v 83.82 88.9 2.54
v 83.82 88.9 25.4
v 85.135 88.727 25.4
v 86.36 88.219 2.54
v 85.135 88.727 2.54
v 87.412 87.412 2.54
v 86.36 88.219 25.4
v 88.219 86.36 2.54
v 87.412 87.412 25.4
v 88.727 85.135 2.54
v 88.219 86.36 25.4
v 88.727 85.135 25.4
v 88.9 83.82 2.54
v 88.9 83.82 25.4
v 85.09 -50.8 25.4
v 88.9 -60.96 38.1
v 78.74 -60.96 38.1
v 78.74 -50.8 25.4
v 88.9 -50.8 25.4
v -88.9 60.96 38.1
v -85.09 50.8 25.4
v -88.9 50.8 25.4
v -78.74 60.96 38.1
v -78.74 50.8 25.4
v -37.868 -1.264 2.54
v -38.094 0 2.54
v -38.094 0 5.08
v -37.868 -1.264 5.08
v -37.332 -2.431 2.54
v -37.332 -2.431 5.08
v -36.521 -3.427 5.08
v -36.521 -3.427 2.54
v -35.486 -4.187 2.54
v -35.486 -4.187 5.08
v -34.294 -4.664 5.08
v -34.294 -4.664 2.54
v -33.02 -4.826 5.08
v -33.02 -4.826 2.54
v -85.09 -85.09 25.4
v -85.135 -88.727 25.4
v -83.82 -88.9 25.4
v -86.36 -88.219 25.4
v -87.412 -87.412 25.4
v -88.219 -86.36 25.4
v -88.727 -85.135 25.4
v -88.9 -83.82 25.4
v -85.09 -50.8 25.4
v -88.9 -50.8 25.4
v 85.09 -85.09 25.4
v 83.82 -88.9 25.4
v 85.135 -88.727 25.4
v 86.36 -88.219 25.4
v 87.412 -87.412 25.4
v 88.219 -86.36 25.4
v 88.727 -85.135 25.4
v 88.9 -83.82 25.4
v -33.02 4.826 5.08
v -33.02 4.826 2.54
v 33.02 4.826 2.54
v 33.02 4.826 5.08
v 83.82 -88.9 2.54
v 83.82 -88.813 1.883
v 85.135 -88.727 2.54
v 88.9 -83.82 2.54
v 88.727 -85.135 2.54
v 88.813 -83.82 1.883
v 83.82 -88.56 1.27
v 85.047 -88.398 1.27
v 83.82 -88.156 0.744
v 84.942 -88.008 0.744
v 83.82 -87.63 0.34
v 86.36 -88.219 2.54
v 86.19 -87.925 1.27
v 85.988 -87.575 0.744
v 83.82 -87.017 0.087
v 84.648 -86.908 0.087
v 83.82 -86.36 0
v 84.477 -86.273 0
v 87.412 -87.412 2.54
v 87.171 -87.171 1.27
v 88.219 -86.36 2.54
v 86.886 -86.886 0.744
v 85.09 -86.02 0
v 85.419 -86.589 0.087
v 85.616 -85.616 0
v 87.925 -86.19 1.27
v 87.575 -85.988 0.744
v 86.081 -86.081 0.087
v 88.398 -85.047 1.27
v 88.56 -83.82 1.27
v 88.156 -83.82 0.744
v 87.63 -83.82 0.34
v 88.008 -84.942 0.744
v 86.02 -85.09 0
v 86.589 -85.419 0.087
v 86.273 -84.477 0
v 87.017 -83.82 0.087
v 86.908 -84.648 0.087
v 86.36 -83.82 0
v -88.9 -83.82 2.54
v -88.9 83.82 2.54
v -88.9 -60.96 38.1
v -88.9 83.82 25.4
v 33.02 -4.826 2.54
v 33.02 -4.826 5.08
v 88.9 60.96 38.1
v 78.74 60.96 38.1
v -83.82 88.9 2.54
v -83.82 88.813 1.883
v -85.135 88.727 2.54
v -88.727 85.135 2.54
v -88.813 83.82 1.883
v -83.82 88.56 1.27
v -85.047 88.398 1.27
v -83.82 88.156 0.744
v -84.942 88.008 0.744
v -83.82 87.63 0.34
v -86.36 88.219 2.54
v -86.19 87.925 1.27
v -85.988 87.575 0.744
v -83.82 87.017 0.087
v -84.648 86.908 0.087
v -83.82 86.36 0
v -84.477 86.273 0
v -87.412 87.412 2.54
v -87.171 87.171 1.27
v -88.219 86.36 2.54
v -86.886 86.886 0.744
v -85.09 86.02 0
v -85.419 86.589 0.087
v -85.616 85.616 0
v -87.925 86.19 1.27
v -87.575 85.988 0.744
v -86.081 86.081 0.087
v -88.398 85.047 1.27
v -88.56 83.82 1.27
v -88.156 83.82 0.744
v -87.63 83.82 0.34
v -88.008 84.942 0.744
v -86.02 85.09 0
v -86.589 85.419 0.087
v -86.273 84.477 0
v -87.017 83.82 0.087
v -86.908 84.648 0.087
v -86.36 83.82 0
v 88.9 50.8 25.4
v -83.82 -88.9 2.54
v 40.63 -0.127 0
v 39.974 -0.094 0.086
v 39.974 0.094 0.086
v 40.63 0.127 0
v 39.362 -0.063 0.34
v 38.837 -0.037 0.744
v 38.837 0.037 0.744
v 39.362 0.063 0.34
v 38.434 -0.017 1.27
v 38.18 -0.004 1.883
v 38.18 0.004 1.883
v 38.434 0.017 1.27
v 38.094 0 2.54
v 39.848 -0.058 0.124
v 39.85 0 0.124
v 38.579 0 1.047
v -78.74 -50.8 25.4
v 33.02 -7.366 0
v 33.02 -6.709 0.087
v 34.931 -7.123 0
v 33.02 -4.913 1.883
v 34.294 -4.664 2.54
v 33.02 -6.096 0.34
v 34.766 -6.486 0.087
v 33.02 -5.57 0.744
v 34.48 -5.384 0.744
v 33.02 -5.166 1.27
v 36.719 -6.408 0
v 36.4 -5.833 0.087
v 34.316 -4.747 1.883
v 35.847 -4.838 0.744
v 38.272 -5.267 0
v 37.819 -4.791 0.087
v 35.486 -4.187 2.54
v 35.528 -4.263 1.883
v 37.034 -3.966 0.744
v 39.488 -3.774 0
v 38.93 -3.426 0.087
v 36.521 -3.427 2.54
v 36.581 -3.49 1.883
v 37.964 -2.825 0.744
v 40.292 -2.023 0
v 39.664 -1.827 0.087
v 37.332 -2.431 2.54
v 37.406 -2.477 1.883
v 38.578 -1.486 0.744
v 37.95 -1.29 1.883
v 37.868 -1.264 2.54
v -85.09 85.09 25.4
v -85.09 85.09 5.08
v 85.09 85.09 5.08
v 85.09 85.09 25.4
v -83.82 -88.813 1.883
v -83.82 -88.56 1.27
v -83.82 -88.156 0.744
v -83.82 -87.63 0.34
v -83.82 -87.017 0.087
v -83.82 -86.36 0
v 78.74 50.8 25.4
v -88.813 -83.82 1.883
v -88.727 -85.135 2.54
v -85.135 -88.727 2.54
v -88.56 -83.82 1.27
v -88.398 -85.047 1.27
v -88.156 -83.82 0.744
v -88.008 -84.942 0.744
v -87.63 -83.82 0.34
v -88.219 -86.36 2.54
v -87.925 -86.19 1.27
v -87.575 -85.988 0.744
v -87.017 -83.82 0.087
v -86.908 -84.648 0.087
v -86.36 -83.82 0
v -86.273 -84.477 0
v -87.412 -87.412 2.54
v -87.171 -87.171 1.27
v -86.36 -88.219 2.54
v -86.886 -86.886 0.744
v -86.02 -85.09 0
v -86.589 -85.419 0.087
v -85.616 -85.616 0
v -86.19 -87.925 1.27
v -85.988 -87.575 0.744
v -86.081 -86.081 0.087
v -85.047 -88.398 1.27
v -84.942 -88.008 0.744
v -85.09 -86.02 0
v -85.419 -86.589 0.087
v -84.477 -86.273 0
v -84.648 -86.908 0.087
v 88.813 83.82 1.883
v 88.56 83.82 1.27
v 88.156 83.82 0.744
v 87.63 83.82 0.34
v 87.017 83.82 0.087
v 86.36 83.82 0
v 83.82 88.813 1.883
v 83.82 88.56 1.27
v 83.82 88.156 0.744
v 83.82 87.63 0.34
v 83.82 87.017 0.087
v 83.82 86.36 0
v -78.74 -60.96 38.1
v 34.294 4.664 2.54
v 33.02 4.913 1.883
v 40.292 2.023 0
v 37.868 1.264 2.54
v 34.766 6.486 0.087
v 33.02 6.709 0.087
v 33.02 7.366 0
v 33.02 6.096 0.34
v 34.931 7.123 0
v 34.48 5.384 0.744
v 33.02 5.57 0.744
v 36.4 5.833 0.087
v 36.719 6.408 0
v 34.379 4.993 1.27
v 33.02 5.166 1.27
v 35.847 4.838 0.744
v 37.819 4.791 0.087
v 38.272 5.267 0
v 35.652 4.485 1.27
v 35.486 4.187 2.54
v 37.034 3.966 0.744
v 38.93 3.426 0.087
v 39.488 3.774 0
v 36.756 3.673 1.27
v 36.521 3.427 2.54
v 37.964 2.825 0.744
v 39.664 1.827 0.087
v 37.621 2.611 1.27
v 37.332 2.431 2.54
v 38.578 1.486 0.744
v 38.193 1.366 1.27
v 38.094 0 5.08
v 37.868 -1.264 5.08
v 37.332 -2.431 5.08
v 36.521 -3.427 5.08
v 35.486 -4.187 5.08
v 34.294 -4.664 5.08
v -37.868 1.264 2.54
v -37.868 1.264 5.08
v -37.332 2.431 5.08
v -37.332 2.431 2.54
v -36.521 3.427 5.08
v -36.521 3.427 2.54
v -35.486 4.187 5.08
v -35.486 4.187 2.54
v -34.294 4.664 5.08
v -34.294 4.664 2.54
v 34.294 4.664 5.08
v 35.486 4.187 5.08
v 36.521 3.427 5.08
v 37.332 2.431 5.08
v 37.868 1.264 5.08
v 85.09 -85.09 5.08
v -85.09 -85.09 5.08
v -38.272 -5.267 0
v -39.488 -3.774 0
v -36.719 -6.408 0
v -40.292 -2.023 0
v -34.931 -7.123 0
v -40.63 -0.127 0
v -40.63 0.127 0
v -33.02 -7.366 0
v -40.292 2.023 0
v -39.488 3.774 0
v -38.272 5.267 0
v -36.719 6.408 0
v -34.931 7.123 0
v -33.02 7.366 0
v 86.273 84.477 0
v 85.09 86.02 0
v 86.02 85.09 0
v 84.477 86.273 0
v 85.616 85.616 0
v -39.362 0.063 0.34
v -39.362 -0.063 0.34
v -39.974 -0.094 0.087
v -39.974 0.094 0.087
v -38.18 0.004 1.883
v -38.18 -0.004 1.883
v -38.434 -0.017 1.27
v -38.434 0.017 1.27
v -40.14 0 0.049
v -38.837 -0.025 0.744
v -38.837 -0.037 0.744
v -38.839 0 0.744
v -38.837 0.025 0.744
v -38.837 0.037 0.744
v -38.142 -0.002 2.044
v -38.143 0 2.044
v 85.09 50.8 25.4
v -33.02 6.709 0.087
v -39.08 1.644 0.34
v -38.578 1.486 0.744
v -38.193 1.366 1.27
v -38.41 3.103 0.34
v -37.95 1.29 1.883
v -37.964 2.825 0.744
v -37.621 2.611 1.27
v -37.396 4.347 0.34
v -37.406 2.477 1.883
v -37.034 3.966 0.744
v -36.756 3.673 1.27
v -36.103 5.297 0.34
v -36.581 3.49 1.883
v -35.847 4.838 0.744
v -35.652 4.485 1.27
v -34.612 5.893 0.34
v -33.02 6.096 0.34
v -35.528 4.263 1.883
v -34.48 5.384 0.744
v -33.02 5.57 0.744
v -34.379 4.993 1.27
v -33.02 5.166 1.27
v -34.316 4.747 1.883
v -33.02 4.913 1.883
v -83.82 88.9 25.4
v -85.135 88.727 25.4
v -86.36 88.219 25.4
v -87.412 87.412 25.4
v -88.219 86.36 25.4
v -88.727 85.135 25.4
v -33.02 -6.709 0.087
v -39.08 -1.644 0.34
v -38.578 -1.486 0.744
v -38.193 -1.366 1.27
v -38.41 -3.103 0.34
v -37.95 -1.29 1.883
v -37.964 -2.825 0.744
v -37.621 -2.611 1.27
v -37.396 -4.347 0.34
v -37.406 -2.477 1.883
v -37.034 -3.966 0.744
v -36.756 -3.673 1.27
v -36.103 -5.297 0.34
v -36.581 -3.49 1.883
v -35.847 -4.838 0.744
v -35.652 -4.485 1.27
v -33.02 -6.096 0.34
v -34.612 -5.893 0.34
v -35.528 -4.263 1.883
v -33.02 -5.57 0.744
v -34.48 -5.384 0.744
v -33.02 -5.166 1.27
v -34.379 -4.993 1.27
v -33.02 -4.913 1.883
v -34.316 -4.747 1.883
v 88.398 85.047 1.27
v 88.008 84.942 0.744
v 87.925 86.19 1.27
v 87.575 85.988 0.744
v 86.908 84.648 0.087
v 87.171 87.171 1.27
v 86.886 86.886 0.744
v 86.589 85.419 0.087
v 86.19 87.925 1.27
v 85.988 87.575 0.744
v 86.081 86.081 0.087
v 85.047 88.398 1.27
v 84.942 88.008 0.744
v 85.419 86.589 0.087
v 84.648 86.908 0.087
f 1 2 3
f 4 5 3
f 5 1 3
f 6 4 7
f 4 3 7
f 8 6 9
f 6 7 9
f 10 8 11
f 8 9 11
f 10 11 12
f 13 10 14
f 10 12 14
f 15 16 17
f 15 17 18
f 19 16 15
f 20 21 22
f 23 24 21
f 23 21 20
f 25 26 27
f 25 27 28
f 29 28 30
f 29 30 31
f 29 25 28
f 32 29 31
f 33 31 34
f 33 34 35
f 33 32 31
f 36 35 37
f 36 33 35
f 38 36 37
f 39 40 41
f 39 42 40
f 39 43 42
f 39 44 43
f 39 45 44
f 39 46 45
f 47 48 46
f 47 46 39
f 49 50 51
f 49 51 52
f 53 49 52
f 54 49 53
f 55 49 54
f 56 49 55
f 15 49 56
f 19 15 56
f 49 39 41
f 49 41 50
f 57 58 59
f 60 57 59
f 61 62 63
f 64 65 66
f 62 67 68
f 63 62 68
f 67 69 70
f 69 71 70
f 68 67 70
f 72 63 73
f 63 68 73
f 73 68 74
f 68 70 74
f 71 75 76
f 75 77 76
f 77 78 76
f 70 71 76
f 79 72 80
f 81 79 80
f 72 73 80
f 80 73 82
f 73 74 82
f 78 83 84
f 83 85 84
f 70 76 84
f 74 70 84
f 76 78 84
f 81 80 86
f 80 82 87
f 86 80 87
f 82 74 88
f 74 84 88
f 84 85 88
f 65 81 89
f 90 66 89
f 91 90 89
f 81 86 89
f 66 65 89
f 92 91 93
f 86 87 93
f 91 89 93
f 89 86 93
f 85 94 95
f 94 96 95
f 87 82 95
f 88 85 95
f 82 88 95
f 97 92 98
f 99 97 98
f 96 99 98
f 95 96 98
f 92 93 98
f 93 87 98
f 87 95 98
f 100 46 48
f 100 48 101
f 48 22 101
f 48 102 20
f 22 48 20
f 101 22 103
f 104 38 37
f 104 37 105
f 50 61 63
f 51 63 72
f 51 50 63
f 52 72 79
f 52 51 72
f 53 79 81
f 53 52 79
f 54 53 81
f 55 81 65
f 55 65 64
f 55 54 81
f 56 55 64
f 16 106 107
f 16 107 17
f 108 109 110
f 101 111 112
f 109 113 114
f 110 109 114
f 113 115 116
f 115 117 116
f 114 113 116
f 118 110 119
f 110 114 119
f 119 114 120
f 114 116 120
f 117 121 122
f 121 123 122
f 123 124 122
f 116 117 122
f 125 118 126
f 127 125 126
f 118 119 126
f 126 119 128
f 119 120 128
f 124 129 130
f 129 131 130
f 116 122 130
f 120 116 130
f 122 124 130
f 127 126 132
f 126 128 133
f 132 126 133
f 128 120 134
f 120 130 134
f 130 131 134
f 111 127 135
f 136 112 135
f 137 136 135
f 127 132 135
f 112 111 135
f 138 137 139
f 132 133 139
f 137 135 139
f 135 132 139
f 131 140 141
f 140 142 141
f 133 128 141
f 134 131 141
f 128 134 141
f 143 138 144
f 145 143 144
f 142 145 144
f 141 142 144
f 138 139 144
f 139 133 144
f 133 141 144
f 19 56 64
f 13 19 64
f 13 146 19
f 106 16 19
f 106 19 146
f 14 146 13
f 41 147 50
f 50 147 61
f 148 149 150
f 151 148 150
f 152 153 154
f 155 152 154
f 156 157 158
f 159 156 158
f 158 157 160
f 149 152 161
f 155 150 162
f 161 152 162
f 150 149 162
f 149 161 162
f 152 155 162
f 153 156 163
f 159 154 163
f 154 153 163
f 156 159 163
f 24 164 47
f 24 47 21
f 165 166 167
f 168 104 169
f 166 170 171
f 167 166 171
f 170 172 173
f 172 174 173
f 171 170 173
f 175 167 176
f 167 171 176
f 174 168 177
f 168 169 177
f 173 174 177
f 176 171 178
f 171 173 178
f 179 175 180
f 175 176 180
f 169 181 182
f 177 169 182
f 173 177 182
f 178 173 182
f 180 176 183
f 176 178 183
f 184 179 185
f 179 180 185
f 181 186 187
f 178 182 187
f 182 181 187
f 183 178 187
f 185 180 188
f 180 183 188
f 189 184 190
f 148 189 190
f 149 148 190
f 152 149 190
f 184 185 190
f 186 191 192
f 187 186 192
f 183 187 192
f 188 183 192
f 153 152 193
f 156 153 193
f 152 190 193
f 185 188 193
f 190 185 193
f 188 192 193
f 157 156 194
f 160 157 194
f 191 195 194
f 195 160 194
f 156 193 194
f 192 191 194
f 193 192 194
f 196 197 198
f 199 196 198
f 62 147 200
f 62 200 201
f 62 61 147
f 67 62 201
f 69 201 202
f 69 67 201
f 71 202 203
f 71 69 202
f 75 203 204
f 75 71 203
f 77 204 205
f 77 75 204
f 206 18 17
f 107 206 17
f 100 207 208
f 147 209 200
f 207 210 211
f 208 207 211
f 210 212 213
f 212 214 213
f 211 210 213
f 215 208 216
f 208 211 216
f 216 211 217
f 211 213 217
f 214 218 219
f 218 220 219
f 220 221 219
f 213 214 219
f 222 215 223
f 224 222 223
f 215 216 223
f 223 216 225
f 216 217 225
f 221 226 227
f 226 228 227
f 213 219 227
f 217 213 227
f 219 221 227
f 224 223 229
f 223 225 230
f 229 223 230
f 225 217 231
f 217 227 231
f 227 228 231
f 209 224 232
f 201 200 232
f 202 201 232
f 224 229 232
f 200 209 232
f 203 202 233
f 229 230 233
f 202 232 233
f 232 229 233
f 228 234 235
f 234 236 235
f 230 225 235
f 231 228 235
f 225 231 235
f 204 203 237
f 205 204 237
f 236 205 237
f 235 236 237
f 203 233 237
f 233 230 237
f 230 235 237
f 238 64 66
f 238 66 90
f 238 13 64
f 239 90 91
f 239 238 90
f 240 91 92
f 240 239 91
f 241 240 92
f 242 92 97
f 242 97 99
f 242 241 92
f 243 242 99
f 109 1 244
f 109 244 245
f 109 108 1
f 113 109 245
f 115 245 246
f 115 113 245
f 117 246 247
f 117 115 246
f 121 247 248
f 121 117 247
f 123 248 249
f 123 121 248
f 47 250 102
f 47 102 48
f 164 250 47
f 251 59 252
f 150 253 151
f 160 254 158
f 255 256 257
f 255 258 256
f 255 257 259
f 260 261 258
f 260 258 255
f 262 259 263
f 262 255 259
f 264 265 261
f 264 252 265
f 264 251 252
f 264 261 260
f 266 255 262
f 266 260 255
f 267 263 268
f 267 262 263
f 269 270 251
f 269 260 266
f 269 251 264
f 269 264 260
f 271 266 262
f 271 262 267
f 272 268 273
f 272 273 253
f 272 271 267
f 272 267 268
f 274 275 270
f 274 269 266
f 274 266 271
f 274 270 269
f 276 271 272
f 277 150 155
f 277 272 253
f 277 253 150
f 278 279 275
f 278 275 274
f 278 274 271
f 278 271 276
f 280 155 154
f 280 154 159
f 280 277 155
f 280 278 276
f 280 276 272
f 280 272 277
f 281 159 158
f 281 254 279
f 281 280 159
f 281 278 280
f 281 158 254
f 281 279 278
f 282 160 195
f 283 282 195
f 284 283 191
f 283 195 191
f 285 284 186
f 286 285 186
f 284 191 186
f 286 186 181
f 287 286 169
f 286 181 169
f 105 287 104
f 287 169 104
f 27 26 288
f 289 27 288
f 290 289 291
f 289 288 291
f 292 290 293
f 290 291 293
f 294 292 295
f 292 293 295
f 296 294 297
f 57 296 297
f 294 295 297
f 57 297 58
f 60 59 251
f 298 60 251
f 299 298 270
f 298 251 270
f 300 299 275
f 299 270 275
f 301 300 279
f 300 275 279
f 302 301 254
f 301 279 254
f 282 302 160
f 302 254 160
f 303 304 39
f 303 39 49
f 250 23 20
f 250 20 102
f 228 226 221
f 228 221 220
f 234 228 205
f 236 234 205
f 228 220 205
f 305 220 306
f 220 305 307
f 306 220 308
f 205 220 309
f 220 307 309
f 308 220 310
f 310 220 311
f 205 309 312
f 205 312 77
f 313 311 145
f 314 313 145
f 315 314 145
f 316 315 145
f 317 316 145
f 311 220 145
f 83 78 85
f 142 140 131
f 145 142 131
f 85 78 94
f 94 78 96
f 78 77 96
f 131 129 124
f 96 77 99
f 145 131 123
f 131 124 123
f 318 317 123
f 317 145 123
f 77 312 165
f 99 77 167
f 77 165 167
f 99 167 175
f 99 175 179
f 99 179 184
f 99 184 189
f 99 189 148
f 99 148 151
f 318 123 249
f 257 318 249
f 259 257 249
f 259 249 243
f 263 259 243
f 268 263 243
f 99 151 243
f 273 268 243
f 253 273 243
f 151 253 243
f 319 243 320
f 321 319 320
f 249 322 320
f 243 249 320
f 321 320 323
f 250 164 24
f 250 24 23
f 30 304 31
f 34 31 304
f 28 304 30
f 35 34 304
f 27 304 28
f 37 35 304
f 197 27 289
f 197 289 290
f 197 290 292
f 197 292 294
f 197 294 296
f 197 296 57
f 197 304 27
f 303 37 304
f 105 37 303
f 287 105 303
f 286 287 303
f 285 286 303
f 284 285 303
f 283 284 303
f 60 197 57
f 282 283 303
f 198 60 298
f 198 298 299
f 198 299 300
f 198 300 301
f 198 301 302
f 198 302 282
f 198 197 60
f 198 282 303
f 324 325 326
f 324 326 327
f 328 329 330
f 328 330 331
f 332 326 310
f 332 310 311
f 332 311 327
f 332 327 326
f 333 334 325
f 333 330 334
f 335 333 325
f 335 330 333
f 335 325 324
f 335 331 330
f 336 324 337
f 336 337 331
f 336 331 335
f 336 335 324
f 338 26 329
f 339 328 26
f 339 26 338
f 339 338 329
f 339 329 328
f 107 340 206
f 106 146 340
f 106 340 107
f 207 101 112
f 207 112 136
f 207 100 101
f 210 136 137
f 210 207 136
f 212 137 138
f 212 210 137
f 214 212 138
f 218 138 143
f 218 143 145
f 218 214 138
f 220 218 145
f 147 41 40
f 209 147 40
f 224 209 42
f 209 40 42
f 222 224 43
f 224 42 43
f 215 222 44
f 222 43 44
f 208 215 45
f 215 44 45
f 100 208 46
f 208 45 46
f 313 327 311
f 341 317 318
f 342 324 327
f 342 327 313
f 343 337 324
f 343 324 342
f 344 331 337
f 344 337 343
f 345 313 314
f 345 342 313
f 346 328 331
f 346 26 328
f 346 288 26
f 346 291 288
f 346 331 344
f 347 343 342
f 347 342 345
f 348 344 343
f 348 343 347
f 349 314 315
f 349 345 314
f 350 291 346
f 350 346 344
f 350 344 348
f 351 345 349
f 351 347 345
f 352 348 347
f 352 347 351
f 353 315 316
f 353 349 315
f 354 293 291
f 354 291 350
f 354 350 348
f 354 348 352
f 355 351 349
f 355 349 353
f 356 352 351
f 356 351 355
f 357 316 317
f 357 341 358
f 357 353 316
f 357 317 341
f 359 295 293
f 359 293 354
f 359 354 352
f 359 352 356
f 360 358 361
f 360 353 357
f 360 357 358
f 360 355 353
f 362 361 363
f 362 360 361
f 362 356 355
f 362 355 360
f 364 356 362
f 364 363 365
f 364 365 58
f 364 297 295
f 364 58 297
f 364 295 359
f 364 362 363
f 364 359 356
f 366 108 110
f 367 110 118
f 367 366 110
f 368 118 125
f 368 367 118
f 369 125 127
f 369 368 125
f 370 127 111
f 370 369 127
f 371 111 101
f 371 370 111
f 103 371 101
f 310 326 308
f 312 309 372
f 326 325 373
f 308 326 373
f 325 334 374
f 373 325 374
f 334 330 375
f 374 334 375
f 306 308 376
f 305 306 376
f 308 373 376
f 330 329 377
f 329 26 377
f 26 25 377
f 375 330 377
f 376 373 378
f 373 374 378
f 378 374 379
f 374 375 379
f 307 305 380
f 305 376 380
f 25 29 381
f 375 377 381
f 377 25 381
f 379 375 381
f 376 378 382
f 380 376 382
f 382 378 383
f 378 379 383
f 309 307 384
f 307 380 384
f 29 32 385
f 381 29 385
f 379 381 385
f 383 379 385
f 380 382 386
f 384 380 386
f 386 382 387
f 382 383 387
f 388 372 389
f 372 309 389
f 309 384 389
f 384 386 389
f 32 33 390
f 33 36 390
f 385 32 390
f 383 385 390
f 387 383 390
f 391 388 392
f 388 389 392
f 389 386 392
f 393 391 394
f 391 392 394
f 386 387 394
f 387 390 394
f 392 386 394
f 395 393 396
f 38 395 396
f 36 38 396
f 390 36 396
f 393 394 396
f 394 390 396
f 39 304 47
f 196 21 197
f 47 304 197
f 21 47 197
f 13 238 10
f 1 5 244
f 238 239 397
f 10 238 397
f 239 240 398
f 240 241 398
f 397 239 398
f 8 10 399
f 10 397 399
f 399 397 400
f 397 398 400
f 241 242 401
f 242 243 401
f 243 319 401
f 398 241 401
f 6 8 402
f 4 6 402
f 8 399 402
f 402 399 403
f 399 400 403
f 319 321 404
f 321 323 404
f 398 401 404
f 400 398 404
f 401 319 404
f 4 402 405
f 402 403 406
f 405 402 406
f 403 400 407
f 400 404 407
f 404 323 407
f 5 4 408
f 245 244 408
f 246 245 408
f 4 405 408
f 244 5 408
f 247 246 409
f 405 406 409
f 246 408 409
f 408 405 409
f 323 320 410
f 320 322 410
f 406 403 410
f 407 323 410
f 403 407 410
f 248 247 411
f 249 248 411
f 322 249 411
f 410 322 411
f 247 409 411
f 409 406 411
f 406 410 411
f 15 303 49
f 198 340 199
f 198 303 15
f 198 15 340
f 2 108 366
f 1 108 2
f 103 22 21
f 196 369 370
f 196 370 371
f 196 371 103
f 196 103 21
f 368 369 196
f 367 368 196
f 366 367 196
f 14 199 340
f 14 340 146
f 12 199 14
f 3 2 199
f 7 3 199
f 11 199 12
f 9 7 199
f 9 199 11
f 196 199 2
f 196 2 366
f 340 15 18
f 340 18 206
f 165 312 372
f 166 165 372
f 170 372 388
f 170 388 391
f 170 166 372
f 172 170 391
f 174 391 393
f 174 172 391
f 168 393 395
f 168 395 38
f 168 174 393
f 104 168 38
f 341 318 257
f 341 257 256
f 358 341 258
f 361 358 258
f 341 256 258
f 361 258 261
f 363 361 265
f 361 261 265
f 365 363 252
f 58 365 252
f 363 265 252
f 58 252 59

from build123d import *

# Parameters (mm, degrees)
F0_W        = 177.8
F0_H        = 177.8
F0_W_2      = 170.18
F0_H_2      = 170.18
F1_DEPTH    = 25.4
F0_W_3      = 76.2
F0_H_3      = 9.652
F2_DEPTH    = 5.08
F3_T1_DEPTH = 5.08
F5_DEPTH    = 177.8
F6_W        = 78.74
F6_H        = 15.522254324
F7_DEPTH    = 177.801
F8_R        = 5.08
F9_R        = 2.54


# Not quite as in the source:
# - a fillet or chamfer that OpenCascade refuses, or shapes differently, is made with other operations: its cross-section is extruded or revolved along the edge and cut away or added


with BuildPart() as f1:
    # F0 (on Top) → F1 (new body)
    with BuildSketch(Plane.XY):
        Rectangle(F0_W, F0_H)
        Rectangle(F0_W_2, F0_H_2, mode=Mode.SUBTRACT)
    extrude(amount=F1_DEPTH)

    # F0 (on Top) → F2 (join)
    with BuildSketch(Plane.XY):
        Rectangle(F0_W_2, F0_H_2)
        Rectangle(F0_W_3, F0_H_3, mode=Mode.SUBTRACT)
    extrude(amount=F2_DEPTH)

    # F3: fillet of radius 5.08 on 4 edges, made by hand

    # F3_s2 → F3_t1 (join)
    with BuildSketch(Plane.XY):
        with BuildLine():
            ThreePointArc((33.02, 4.826), (36.6121024484, 3.3381024484), (38.1, -0.254))
            Line((38.1, -0.254), (38.1, 4.826))
            Line((38.1, 4.826), (33.02, 4.826))
        make_face()
        with BuildLine():
            ThreePointArc((38.1, 0.254), (36.6121024484, -3.3381024484), (33.02, -4.826))
            Line((33.02, -4.826), (38.1, -4.826))
            Line((38.1, -4.826), (38.1, 0.254))
        make_face()
        with BuildLine():
            ThreePointArc((-38.1, -0.254), (-36.6121024484, 3.3381024484), (-33.02, 4.826))
            Line((-33.02, 4.826), (-38.1, 4.826))
            Line((-38.1, 4.826), (-38.1, -0.254))
        make_face()
        with BuildLine():
            ThreePointArc((-38.1, 0.254), (-36.6121024484, -3.3381024484), (-33.02, -4.826))
            Line((-33.02, -4.826), (-38.1, -4.826))
            Line((-38.1, -4.826), (-38.1, 0.254))
        make_face()
    extrude(amount=F3_T1_DEPTH)

    # F4 (on face) → F5 (join, through all)
    with BuildSketch(Plane.YZ.offset(88.9)):
        Polygon((-50.8, 25.4), (0, 25.4), (0, 38.1), (-60.96, 38.1), align=None)
        Polygon((0, 38.1), (0, 25.4), (50.8, 25.4), (60.96, 38.1), align=None)
    extrude(amount=-F5_DEPTH)

    # F6 (on face) → F7 (cut, through all)
    with BuildSketch(Plane(origin=(0, 88.9, 0), x_dir=(-1, 0, 0), z_dir=(0, 1, 0))):
        with Locations((-39.37, 33.161127162)):
            Rectangle(F6_W, F6_H)
        with Locations((39.37, 33.161127162)):
            Rectangle(F6_W, F6_H)
    extrude(amount=-F7_DEPTH, mode=Mode.SUBTRACT)

    # F8
    f8_edges = [f1.edges().sort_by_distance(p)[0] for p in [
        (88.9, -88.9, 12.7),
        (88.9, 88.9, 12.7),
        (-88.9, 88.9, 12.7),
        (-88.9, -88.9, 12.7),
    ]]
    fillet(f8_edges, radius=F8_R)

    # F9
    f9_edges = [f1.edges().sort_by_distance(p)[0] for p in [
        (88.9, 0, 0),
        (0, 88.9, 0),
        (87.412102, -87.412102, 0),
        (87.412102, 87.412102, 0),
        (0, -88.9, 0),
        (-87.412102, -87.412102, 0),
        (-87.412102, 87.412102, 0),
        (-88.9, 0, 0),
        (0, -4.826, 0),
        (-36.521148, -3.42681, 0),
        (-36.521148, 3.42681, 0),
        (0, 4.826, 0),
        (36.521148, 3.42681, 0),
        (36.521148, -3.42681, 0),
    ]]
    fillet(f9_edges, radius=F9_R)


solid = f1.part
